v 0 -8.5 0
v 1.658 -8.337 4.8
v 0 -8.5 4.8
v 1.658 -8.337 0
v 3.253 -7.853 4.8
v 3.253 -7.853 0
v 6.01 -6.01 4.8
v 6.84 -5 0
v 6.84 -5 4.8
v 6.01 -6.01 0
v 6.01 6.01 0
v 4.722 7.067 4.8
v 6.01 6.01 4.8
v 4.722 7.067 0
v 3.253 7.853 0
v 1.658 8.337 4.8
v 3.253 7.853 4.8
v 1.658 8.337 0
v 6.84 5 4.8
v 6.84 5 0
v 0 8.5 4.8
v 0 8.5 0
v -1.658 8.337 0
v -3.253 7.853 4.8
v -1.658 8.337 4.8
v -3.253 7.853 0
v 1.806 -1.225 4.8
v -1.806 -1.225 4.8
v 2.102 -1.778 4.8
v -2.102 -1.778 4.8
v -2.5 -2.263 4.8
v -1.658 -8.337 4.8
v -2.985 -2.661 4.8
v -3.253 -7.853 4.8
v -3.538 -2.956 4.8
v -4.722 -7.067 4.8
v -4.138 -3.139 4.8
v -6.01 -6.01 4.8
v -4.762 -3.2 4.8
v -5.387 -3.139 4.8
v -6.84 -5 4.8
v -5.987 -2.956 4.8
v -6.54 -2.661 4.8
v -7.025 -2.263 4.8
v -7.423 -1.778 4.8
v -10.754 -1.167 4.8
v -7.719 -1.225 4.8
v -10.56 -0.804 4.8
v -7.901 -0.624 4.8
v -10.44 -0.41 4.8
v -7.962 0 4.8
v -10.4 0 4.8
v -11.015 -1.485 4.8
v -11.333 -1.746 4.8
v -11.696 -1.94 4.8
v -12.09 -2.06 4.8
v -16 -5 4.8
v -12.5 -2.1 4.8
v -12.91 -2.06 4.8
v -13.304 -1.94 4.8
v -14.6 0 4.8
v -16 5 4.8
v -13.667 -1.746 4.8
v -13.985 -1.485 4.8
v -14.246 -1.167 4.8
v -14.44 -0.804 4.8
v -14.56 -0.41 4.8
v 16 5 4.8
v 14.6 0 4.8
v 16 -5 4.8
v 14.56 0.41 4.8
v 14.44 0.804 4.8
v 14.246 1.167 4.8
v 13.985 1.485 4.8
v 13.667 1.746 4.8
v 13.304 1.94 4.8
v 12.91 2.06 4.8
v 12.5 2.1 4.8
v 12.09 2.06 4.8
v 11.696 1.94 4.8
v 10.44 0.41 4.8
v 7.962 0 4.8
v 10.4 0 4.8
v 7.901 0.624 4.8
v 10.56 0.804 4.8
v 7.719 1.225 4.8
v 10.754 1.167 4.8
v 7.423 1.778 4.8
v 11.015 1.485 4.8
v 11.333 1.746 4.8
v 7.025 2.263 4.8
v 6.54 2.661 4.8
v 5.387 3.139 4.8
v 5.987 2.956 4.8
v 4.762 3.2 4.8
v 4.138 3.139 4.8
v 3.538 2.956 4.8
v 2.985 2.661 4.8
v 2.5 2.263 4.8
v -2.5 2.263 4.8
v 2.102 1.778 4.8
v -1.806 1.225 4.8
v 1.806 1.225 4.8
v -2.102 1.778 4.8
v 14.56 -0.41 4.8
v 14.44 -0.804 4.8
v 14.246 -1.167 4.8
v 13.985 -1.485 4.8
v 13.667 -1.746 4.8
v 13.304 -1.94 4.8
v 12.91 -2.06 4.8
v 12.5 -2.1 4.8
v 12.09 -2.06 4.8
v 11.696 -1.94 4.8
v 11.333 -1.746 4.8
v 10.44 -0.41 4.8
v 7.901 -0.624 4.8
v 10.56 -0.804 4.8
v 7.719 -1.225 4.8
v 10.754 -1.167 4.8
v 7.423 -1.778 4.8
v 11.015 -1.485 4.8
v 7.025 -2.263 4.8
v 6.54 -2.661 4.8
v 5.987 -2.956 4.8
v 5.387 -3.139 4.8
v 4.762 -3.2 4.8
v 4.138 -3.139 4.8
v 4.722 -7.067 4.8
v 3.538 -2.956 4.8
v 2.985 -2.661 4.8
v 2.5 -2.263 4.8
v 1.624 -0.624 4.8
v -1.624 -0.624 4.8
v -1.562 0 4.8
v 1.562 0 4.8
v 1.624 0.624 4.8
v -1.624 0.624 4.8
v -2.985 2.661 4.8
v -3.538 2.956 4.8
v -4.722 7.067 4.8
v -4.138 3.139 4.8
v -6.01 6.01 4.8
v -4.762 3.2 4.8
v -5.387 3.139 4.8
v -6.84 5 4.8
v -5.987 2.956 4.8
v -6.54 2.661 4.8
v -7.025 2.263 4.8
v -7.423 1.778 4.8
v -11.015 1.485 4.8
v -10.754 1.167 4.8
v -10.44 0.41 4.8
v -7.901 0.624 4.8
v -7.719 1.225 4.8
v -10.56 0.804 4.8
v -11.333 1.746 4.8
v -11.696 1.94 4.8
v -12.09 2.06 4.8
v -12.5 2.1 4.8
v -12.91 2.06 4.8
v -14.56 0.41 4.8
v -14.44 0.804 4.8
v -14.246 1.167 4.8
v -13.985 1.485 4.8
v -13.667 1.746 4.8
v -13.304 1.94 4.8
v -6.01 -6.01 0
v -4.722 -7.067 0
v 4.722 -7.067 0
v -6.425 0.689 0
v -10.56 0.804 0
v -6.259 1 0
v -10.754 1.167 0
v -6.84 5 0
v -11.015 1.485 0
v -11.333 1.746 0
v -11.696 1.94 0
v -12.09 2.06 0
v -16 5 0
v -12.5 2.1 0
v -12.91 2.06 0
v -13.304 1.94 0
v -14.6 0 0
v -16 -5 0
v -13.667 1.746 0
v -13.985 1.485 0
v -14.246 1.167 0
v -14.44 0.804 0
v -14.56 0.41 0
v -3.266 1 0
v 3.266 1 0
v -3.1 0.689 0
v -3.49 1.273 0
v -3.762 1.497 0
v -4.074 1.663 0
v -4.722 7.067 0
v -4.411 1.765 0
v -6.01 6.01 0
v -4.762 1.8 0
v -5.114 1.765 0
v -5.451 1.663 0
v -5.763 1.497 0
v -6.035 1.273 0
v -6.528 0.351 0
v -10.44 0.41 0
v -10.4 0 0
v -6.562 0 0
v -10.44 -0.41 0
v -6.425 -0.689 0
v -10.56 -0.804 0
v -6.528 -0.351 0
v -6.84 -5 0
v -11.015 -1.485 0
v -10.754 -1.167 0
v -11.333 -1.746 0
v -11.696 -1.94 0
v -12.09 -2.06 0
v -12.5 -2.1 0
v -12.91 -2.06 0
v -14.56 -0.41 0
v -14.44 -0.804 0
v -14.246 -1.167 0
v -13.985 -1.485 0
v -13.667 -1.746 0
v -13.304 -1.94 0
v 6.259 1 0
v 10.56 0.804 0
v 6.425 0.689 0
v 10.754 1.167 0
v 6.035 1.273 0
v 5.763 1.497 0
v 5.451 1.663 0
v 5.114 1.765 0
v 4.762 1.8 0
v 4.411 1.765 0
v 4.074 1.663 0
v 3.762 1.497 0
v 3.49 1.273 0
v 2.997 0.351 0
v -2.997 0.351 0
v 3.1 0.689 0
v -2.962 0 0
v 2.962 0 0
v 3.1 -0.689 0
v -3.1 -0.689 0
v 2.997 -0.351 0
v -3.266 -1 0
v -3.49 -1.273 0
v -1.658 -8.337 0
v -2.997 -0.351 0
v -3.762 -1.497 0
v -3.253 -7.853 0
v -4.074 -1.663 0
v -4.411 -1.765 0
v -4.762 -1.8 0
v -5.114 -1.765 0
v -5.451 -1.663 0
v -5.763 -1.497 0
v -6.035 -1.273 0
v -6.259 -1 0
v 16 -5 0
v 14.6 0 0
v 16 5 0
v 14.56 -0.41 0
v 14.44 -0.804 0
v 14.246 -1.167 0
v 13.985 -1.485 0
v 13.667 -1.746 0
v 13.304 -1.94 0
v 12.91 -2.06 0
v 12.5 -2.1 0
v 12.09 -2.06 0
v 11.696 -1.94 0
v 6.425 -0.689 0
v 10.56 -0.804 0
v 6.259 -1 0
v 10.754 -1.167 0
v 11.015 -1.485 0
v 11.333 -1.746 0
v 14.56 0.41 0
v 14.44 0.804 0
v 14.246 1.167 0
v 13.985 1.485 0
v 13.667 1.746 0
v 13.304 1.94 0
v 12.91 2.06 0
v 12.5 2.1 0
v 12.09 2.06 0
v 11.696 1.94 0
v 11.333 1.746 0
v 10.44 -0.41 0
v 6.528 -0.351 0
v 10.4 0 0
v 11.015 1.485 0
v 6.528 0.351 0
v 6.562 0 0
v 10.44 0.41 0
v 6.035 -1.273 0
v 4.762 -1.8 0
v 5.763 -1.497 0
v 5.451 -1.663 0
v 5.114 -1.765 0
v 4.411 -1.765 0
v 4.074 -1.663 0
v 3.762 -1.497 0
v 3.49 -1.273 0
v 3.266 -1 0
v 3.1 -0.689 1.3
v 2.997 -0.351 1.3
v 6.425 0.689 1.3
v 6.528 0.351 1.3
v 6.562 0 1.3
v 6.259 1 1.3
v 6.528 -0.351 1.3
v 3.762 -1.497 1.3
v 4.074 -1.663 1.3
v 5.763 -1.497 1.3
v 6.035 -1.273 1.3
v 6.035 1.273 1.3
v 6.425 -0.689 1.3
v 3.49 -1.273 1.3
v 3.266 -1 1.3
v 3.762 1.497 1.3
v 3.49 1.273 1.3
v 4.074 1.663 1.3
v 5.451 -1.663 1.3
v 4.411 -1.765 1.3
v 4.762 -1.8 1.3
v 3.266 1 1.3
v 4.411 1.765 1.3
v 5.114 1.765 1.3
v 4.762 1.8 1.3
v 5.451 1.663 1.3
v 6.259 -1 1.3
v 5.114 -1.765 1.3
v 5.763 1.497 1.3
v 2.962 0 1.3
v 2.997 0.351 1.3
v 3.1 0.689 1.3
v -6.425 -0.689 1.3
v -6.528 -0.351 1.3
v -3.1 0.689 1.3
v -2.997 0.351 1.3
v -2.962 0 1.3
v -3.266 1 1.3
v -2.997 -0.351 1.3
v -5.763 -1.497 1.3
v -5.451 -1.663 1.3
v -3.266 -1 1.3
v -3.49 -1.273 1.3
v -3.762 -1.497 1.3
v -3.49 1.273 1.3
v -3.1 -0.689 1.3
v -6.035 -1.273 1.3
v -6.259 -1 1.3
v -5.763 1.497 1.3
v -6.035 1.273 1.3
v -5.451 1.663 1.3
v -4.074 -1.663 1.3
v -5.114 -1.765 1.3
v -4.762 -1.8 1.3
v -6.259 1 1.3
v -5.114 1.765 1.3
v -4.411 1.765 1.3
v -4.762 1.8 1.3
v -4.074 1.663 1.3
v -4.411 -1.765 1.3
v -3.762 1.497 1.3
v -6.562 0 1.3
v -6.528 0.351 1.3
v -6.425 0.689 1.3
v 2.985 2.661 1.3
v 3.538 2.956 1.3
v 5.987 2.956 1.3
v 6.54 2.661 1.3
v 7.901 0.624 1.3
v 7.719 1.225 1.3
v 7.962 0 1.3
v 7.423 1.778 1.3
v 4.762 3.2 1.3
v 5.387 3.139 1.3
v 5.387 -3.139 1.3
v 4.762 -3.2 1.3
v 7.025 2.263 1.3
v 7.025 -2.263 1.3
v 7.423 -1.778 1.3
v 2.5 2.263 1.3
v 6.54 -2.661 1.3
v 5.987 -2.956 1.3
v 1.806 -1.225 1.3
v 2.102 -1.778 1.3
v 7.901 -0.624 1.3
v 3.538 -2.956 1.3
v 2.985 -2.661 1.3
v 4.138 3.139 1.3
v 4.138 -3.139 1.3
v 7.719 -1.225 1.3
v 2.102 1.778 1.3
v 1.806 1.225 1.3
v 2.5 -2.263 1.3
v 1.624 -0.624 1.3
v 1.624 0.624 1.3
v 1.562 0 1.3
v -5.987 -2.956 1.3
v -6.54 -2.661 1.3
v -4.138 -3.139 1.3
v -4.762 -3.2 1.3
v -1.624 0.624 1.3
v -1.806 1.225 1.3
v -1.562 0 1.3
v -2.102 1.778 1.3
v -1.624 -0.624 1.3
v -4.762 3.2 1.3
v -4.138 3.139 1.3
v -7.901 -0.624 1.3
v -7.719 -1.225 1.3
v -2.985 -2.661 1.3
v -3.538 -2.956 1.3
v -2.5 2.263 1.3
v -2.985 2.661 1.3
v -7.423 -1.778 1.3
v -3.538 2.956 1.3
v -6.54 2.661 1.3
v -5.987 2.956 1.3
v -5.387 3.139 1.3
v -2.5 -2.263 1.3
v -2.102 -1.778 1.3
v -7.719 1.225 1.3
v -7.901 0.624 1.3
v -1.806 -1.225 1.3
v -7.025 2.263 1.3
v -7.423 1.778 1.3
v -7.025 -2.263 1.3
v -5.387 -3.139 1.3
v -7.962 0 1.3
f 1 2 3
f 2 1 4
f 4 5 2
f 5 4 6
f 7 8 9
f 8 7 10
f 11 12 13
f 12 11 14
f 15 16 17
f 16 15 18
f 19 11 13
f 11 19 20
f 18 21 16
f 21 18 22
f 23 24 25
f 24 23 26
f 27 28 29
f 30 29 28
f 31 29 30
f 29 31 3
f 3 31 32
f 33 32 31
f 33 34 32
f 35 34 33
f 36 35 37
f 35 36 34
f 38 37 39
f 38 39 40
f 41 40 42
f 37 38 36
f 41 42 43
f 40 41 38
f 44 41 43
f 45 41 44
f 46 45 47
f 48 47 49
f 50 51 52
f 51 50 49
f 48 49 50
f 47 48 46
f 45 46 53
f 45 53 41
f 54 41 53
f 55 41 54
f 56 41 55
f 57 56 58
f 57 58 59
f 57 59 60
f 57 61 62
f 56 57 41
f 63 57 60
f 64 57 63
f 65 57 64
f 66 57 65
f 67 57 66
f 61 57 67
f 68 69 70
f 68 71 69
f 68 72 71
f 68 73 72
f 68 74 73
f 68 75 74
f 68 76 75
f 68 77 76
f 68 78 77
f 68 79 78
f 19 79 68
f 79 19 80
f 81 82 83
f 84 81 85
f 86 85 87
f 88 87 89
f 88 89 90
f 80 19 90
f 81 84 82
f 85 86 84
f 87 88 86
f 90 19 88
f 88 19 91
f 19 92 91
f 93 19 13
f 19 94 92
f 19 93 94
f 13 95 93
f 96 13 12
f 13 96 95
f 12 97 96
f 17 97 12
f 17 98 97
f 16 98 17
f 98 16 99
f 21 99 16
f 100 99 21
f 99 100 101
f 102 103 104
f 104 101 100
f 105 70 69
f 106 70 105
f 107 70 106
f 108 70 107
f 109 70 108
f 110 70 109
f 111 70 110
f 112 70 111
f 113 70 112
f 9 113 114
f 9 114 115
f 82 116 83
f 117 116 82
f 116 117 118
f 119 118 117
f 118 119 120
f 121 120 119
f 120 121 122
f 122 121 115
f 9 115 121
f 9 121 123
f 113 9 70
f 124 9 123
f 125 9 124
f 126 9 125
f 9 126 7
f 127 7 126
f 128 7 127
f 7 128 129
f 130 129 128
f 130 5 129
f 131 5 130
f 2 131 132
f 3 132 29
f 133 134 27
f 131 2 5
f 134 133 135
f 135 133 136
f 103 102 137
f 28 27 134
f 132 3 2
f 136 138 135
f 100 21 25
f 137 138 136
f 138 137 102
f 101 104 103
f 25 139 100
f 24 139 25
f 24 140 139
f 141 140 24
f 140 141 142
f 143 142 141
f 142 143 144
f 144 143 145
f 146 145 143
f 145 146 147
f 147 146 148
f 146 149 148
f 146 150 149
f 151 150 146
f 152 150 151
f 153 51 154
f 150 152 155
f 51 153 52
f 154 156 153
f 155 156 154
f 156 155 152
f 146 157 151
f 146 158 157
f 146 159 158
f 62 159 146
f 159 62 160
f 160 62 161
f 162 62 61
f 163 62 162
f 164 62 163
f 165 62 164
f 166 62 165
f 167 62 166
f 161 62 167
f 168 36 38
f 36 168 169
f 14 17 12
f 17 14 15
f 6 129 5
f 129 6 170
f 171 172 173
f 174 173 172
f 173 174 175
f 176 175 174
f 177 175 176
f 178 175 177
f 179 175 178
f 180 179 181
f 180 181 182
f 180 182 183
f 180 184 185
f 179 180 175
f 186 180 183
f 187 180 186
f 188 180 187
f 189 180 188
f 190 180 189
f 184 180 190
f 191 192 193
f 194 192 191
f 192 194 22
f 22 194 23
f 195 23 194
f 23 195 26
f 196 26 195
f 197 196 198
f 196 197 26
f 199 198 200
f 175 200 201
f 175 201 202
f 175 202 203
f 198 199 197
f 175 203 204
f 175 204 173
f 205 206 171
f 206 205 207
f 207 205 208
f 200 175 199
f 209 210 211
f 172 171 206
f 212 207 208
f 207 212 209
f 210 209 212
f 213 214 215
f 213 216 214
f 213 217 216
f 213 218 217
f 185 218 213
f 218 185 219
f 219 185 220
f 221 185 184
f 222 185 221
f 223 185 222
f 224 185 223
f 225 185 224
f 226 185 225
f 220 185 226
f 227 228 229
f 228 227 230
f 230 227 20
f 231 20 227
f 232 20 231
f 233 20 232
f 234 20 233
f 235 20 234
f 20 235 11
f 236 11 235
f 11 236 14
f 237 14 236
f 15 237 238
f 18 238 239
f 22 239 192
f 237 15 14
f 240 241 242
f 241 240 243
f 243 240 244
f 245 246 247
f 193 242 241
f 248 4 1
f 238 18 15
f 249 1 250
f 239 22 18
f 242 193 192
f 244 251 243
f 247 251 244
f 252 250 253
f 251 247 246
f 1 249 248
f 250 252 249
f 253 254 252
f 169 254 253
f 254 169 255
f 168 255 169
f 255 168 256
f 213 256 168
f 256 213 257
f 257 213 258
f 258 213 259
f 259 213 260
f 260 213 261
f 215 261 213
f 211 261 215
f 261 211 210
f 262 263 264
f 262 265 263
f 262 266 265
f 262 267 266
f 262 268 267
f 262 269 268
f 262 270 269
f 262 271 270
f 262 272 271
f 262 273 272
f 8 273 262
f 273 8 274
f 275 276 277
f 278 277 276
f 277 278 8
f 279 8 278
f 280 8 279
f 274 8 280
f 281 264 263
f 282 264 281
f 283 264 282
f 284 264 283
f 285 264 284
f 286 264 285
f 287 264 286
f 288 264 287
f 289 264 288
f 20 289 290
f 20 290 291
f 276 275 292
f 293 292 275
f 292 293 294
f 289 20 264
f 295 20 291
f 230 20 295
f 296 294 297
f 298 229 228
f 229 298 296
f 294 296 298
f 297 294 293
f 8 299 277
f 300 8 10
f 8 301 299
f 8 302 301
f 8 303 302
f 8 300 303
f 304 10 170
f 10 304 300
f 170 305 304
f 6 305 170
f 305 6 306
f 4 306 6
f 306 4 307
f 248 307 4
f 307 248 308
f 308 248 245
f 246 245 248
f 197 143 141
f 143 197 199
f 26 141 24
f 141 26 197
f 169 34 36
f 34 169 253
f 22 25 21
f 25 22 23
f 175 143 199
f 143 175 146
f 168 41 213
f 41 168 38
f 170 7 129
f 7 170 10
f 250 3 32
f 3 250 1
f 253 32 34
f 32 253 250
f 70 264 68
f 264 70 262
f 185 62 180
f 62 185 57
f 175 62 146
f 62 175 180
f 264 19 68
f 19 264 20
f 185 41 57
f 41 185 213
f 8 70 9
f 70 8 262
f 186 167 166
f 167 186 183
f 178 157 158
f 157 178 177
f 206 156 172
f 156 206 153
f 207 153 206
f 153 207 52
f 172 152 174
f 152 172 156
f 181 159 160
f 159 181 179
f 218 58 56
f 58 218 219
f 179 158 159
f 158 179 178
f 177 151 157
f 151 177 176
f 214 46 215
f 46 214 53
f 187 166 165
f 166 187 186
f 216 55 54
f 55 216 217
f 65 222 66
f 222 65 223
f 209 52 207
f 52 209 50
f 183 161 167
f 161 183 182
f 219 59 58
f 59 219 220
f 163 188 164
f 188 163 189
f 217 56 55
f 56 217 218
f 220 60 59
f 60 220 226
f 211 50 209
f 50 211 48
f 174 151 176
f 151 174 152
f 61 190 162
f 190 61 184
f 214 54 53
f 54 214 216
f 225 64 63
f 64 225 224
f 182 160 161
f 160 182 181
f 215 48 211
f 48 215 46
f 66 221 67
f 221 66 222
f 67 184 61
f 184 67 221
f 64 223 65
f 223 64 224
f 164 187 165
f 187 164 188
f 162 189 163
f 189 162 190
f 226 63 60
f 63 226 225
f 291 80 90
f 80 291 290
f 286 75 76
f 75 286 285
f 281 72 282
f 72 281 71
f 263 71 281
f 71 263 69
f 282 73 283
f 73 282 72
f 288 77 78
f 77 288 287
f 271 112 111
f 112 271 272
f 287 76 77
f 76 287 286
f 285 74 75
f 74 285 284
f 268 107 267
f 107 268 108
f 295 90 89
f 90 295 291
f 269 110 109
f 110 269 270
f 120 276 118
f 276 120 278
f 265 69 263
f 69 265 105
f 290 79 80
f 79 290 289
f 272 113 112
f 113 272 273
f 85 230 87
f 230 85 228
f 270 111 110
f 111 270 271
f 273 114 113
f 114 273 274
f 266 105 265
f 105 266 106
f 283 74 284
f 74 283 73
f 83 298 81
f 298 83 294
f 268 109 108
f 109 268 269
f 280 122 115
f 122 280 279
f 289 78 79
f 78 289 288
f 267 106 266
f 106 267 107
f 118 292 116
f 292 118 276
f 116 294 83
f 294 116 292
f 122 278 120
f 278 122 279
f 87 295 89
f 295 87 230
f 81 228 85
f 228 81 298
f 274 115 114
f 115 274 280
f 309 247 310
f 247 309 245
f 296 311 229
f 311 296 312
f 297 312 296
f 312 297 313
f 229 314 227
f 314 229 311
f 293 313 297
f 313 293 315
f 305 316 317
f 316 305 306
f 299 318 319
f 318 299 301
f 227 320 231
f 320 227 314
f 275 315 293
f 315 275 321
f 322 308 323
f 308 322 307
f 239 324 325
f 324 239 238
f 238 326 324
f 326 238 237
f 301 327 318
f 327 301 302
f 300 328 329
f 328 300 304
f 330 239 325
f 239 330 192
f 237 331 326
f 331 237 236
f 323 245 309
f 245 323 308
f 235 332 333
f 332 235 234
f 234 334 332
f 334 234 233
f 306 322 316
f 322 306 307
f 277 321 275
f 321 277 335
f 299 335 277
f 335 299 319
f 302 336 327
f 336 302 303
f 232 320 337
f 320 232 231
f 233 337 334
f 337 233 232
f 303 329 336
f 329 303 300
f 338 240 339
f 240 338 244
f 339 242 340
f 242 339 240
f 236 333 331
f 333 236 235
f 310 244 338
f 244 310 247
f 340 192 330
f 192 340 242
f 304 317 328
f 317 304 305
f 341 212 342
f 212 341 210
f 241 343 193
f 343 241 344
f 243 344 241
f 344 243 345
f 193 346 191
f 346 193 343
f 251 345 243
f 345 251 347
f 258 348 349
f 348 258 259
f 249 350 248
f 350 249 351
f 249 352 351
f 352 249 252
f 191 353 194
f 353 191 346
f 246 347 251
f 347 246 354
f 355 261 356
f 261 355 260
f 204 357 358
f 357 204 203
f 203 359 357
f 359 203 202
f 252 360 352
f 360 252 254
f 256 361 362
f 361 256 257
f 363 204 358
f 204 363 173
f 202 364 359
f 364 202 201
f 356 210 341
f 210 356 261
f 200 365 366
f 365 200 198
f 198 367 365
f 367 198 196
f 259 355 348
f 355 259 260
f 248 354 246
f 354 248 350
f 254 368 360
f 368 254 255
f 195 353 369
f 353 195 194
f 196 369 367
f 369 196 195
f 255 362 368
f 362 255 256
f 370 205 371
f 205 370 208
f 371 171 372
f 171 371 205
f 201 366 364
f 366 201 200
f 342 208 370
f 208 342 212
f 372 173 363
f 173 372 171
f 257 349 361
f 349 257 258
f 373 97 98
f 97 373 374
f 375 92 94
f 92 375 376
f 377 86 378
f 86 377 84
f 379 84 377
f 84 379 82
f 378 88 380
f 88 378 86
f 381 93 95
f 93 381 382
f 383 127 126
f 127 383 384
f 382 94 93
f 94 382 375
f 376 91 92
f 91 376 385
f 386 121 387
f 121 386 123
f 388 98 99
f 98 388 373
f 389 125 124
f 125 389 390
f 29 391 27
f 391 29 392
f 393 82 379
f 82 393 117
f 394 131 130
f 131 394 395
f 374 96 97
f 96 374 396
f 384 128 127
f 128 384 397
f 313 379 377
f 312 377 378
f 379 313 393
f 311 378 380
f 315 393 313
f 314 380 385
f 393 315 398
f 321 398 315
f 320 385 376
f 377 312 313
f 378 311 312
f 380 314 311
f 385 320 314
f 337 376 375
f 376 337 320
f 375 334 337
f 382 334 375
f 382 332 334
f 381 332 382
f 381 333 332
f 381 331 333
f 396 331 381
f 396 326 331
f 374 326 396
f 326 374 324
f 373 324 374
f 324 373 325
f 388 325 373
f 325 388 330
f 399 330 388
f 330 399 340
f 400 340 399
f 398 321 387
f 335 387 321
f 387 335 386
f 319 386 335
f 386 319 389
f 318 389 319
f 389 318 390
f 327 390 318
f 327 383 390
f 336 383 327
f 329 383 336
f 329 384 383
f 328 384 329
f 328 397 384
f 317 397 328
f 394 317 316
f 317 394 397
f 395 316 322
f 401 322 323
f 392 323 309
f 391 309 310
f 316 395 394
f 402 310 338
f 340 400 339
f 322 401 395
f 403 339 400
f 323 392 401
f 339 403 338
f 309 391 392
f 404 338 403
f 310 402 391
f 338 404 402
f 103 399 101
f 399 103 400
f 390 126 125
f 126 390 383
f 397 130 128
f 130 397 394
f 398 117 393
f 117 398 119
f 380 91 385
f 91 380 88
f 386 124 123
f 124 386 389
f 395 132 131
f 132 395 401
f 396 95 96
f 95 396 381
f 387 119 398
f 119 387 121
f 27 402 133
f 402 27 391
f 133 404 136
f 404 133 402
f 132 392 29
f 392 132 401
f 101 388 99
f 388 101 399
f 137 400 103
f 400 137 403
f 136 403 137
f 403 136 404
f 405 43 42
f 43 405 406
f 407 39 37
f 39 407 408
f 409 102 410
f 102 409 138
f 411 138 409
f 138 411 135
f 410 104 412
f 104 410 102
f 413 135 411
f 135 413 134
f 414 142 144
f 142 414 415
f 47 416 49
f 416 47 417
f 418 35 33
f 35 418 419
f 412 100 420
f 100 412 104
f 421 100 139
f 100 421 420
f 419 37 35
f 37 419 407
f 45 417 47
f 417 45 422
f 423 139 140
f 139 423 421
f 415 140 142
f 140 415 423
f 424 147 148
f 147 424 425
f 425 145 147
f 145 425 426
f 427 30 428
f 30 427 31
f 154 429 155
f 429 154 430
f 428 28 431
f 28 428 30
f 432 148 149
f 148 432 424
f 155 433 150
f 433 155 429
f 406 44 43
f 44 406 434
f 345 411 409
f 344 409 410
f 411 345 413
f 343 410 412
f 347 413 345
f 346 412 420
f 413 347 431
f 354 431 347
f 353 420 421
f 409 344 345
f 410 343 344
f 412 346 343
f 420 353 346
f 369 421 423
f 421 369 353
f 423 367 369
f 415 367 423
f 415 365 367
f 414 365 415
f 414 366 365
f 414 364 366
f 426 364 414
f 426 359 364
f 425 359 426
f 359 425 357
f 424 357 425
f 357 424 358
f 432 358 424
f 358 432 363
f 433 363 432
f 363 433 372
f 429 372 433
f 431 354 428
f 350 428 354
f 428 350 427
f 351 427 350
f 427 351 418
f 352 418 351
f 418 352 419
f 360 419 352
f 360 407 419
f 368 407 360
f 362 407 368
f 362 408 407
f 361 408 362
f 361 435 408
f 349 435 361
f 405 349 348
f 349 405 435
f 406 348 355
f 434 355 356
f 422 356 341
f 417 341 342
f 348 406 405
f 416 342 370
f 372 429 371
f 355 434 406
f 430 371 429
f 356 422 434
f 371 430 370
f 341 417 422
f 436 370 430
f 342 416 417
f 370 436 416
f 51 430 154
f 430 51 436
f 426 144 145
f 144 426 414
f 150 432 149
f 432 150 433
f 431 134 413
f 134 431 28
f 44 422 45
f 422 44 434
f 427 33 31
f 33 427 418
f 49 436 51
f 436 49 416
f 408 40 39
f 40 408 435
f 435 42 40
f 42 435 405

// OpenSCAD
// file: OpenSampler_v4_config_v0p0.scad
in=25.4;
xs=20;

Lx=440; //was 590 in Opensampler V2,was 480 in Opensampler V3.03
Ly=285;	//was 380 in OpenSampler V2,was 315 in OpenSampler V3.03
Lz=240; // was 220 in Opensampler V2, was 200 in Opensampler V3.03
La=135; //length of moving part on z-axis, was 140 in Opensampler V3.03
LyPlate=169; // length of y-plate that z-axis moves on. was 169 in V3.10

nema17holespac=31;
nema17diagholespac=43.84;

xyarm=28;
zyarm=Lz+xs+6;

platethick=3.175;
backpanelthick=6.35;
frontpanelthick=6;
bottomthick=12.7;
belt_end_thick=4.8;

wheeloffset=12;
plateoffset=wheeloffset-10;

//distance from extrusion surface to bottom plate=2.2mm
// plates are about 2.8mm making plate surface 5mm of extrusion
//hole spacing for wheels: 40.64,60.64,80.64,100.64
// BETTER hole spacing for wheels: 40.0,60.0,80.0,100.0
// hole diam for fixed wheel:5mm, for eccentric: 7.14mm
// spacer block and acme block are 12mm thick.
// 125ml (100ml) bottle size: h=95mm, diam=52mm

// 60mm clearancy for needle and spings etc.
// so height between bottom frame and bottom z-axis:
// trayplate thickness + bottle h + 60
// 13 + 108 + 60 = 188mm

// tallest bottle: 155, smallest bottle: 105
// minimum clearance: 10, spring action: 40
// vertical movement: 155-105+10+30=90


// FOR OpenSampler V4 
// more z-height, 155mm 16mm diam vials expected
// ordered vials of KIMAX 16*150mm, which are 155mm high with cap
// change y cart to have 6 mini wheels for Z-axis
// fit 3 trays of 5*8 (103*160mm, 19mm spacing, 4mm edge)
// main file
include <OpenSampler_v4_config_v0p0.scad>;
$fn=32;


module E1x1(len){
	translate([0,0,0])
	difference(){
		translate([-xs/2,-xs/2,0])
		cube([xs,xs,len]);
		for ( i = [0 : 3] ){
			rotate([0,0,i*90])
			translate([-xs/2-1,-xs/8,-1])
			cube([xs/4,xs/4,len+2]);
		}
		translate([0,0,-1])
		cylinder(r=2.5,h=len+2);
	}	
}

module E1x2(len){
	translate([0,-xs*1/2,0]){
		E1x1(len);
		translate([0,xs,0])
		E1x1(len);
	}
}

module E1x3(len){
	translate([0,-xs*1,0]){
		E1x1(len);
		translate([0,xs,0])
		E1x1(len);
		translate([0,xs*2,0])
		E1x1(len);
	}
}

module wheel(){
	difference(){
		cylinder(r=12,h=11,center=true,$fn=25);
		cylinder(r=2.5,h=12,center=true);
	}
}

module mini_wheel(){
	difference(){
		cylinder(r=7.65,h=10,center=true);
		cylinder(r=2.5,h=12,center=true);
	}
}

// stepper nema 17, with some extra space around
module stepper(){ 
	difference(){
		union(){
			translate([-21,-21,-40])	
				cube([42,42,40],center=false);
			cylinder(r=2.5,h=30,center=false);
			cylinder(r=12,h=4,center=true);
			translate([-15.5,-15.5,0])
				cylinder(r=1.5,h=10,center=false);
			translate([15.5,-15.5,0])
				cylinder(r=1.5,h=10,center=false);
			translate([15.5,15.5,0])
				cylinder(r=1.5,h=10,center=false);
			translate([-15.5,15.5,0])
				cylinder(r=1.5,h=10,center=false);

			translate([0,0,10])
				cylinder(r=8,h=15,center=false);				
		}
	}
}

// stepper nema 17, with TR8-2 rod
module z_stepper(len){ 
	difference(){
		union(){
			translate([-21,-21,-40])	
				cube([42,42,40],center=false);
			cylinder(r=2.5,h=30,center=false);
			cylinder(r=12,h=4,center=true);
			translate([-15.5,-15.5,0])
				cylinder(r=1.5,h=10,center=false);
			translate([15.5,-15.5,0])
				cylinder(r=1.5,h=10,center=false);
			translate([15.5,15.5,0])
				cylinder(r=1.5,h=10,center=false);
			translate([-15.5,15.5,0])
				cylinder(r=1.5,h=10,center=false);
			translate([0,0,0])
				cylinder(r=4,h=len,center=false);					
		}
	}
}


module stepper_holes(){ 
	difference(){
		union(){
			translate([-21.5,-21.5,-49])	
				cube([43,43,49],center=false);
			cylinder(r=2.5,h=70,center=true);
			cylinder(r=14,h=10,center=false);
			cylinder(r=6,h=35,center=false);
			translate([-15.5,-15.5,0])
				cylinder(r=2,h=80,center=true);
			translate([15.5,-15.5,0])
				cylinder(r=2,h=80,center=true);
			translate([15.5,15.5,0])
				cylinder(r=2,h=80,center=true);
			translate([-15.5,15.5,0])
				cylinder(r=2,h=80,center=true);
		
		}
	}
}

// Main plate for x-axis movement 4.8mm aluminum (3/16")
module x_plate_top(){
	difference(){
		union(){
			translate([-5,-37,0])
			cube([115,76,4.8]);

			translate([(104+51.5)/2-21,35-24,0])
			cube([42,42,4.8]);				
            
            // wheels are just for display
			translate([2,-30,-12])
			wheel();
			translate([54,-30,-12])
			wheel();
			translate([104,-30,-12])
			wheel();

			translate([2,30,-12])
			wheel();
			translate([49,30,-12])
			wheel();
			translate([104,30,-12])
			wheel();
		}
        // holes for adjustable wheels
		translate([2,-30,-1])
		cylinder(r=3.57,h=10);
		translate([54,-30,-1])
		cylinder(r=3.57,h=10);
		translate([104,-30,-1])
		cylinder(r=3.57,h=10);

        // holes for M5 thread for wheels
		translate([2,30,-1])
		cylinder(r=2.1,h=10);
		translate([49,30,-1])
		cylinder(r=2.1,h=10);
		translate([104,30,-1])
		cylinder(r=2.1,h=10);

        // holes for attachment y-arm
		translate([xyarm,0,-1]){
			translate([0,30,0])
			cylinder(r=2.5,h=10);
			translate([0,0,0])
			cylinder(r=2.5,h=10);
			translate([0,-25,0])
			cylinder(r=2.5,h=10);
		}
        // pocket for secure attachment of y-arm
		translate([xyarm,0,0])        
        translate([-10,-50,3.2])
        cube([20,100,10]);

        // holes for 20mm endstop switch
		translate([2,-3,-1]){
			translate([0,-4.75,0])
			cylinder(r=1.2,h=10);
			translate([0,4.75,0])
			cylinder(r=1.2,h=10);
		}
        // holes for stepper motor
        translate([(104+51.5)/2,32,4.8+0.1])
        rotate([0,180,0])
        stepper_holes();

	}
	
}



module y_plate_top(){
	difference(){
		union(){
			translate([-36,-32,0])
			cube([LyPlate,64,platethick]);
			translate([-30,-20,-12])
			wheel();
			translate([30,-26,-12])
			wheel();
			translate([-30,26,-12])
			wheel();
			translate([30,26,-12])
			wheel();

			translate([50,25.7,15])
			mini_wheel();
			translate([50,-25.7,15])
			mini_wheel();
			translate([-25,-25,0])
			cube([50,50,3]);
			translate([17,25.7,15])
			mini_wheel();
			translate([17,-25.7,15])
			mini_wheel();
			translate([-16,25.7,15])
			mini_wheel();
			translate([-16,-25.7,15])
			mini_wheel();



		}
		translate([60,0,-1])
		cylinder(r=2.5,h=10);

		translate([30,26,-1])
		cylinder(r=2.5,h=10);
		translate([30,-26,-1])
		cylinder(r=2.5,h=10);

		translate([-30,26,-1])
		cylinder(r=3.57,h=10);
		translate([-30,-20,-1])
		cylinder(r=3.57,h=10);


		translate([50,25.7,-1])
		cylinder(r=3.57,h=10);
		translate([50,-25.7,-1])
		cylinder(r=2.5,h=10);
		translate([17,25.7,-1])
		cylinder(r=3.57,h=10);
		translate([17,-25.7,-1])
		cylinder(r=2.5,h=10);
		translate([-16,25.7,-1])
		cylinder(r=3.57,h=10);
		translate([-16,-25.7,-1])
		cylinder(r=2.5,h=10);

		translate([LyPlate-36-10,-30,-1]){
			translate([-4.75,0,0])
			cylinder(r=1.2,h=10);
			translate([4.75,0,0])
			cylinder(r=1.2,h=10);
		}
 		translate([LyPlate-36,0,-1]){ 
 			translate([-15,-15,0])
			cylinder(r=2.1,h=10);
			translate([-15,15,0])
			cylinder(r=2.1,h=10);     
        }      


	}	


}
module y_plate_bottom(){
	difference(){
		union(){
			translate([35,0,0])
			cylinder(r=32,h=3);
			translate([35,-32,0])
			cube([32,32,3]);
		}
        // holes for M5 thread to attach to y_plate_top
		translate([+30,-26,-1])
		cylinder(r=2.1,h=10);
		translate([+30,26,-1])
		cylinder(r=2.1,h=10);

		translate([60,0,-1])
		cylinder(r=2.1,h=10);

        // cut not needed part off
		translate([0,-32,-1])
		cube([15,64,10]);

        //holes for stepper motor
        translate([36,0,-1])
        stepper_holes();
        
        // hole for cable carrier
        translate([59,-26,-1])
        cylinder(r=2.1,h=100);
	}	
}



module z_motorplate(){
	difference(){
		union(){
            translate([0,-5,0])
			cylinder(r=32,h=platethick);
			translate([-32,-(xs/2+plateoffset+platethick*2),0])
			cube([64,(xs/2+plateoffset+platethick*2)-5,platethick]);

			translate([-32,-18.4,-25])
			cube([64,platethick,25]);
		}
        translate([-35,21,-1])
        cube([70,50,platethick+2]);
        
        // for acme T8 stepper
 		translate([0,0,-1])
		cylinder(r=12,h=10);       

        //holes for 0 deg stepper
 		translate([nema17holespac/2,nema17holespac/2,-1])
		cylinder(r=1.8,h=10);
		translate([-nema17holespac/2,nema17holespac/2,-1])
		cylinder(r=1.8,h=10);       

		translate([-10,-17-10,-1])
		cylinder(r=2.5,h=10);
		translate([10,-17-10,-1])
		cylinder(r=2.5,h=10);

		translate([-50,-118.4,-5])
		cube([100,100,10]);
        
      //holes for connecting to y_plate
        translate([-15,-20,-15])
        rotate([-90,0,0])
        cylinder(r=2.5,h=100);
        translate([15,-20,-15])
        rotate([-90,0,0])
        cylinder(r=2.5,h=100);

	}

}

module belt_end_plate(){
    difference(){
            translate([-20,-10,0])
            cube([40,20,belt_end_thick]);
            //deep under belt
            translate([-10,0,-1])
            cylinder(r=2.55,h=10);
            translate([-10,0,1.3])
            cylinder(r=4.55,h=10);
            // normal
            translate([10,0,-1])
            cylinder(r=2.55,h=10);           
            translate([10,0,3.3])
            cylinder(r=4.55,h=10);   
            // belt clamp screws
            translate([0,5,-1])
            cylinder(r=2,h=10);           
            translate([0,5,3])
            cylinder(r=4.55,h=10);
            translate([0,-5,-1])
            cylinder(r=2,h=10);           
            translate([0,-5,3])
            cylinder(r=4.55,h=10);  
        
            //belt holes
            translate([-16.5,2,-1])
            cylinder(r=1.5,h=10);           
            translate([-16.5,-2,-1])
            cylinder(r=1.5,h=10);      
            translate([3.5,2,-1])
            cylinder(r=1.5,h=10);           
            translate([3.5,-2,-1])
            cylinder(r=1.5,h=10); 
            translate([-18,-2,-1])
            cube([3,4,10]);
            translate([2,-2,-1])
            cube([3,4,10]);
            
            translate([-16.5,-3.5,2.8])
            cube([20,7,10]);
        
    }
}

module belt_end_plate_x(){
    difference(){
            union(){
                translate([-20,-10,0])
                cube([40,20,belt_end_thick]);
                translate([0,10,0])
                cylinder(r=19.99,h=belt_end_thick);
            }
                 
            //deep under belt
            translate([-10,0,-1])
            cylinder(r=2.55,h=10);
            translate([-10,0,1.3])
            cylinder(r=4.55,h=10);
            // normal
            translate([10,0,-1])
            cylinder(r=2.55,h=10);           
            translate([10,0,3.3])
            cylinder(r=4.55,h=10);   
            // belt clamp screws
            translate([0,5,-1])
            cylinder(r=2,h=10);           
            translate([0,5,3])
            cylinder(r=4.55,h=10);
            translate([0,-5,-1])
            cylinder(r=2,h=10);           
            translate([0,-5,3])
            cylinder(r=4.55,h=10);  
        
            //belt holes
            translate([-16.5,2,-1])
            cylinder(r=1.5,h=10);           
            translate([-16.5,-2,-1])
            cylinder(r=1.5,h=10);      
            translate([3.5,2,-1])
            cylinder(r=1.5,h=10);           
            translate([3.5,-2,-1])
            cylinder(r=1.5,h=10); 
            translate([-18,-2,-1])
            cube([3,4,10]);
            translate([2,-2,-1])
            cube([3,4,10]);
            
            translate([-16.5,-3.5,2.8])
            cube([20,7,10]);
        
    }
}

module backpanel(){
	difference(){
		cube([Lx,backpanelthick,Lz-xs]);
		translate([xs+20,-1,xs+20+bottomthick])
		rotate([-90,0,0])
		cylinder(r=15,h=backpanelthick+2);

		translate([xs/2,-1,Lz-xs-20])
		rotate([-90,0,0])
		cylinder(r=2.55,h=backpanelthick+2);
		translate([xs/2,-1,xs+20])
		rotate([-90,0,0])
		cylinder(r=2.55,h=backpanelthick+2);

		translate([Lx-xs/2,-1,Lz-xs-20])
		rotate([-90,0,0])
		cylinder(r=2.55,h=backpanelthick+2);
		translate([Lx-xs/2,-1,xs+20])
		rotate([-90,0,0])
		cylinder(r=2.55,h=backpanelthick+2);

		translate([Lx/2,-1,xs/2])
		rotate([-90,0,0])
		cylinder(r=2.55,h=backpanelthick+2);
		
	}
}

module xcablecarrier(){
	translate([200,-xs,Lz-xs-80])
	cube([Lx-xs-200-2,xs+1, 6]);

}

module frontpanel(){
	difference(){
		translate([0,-xs*3-frontpanelthick,xs+bottomthick-2])
		cube([Lx,backpanelthick,Lz-xs*2-bottomthick+2]);

		translate([xs/2,-xs*3-frontpanelthick-1,xs+40])
		rotate([-90,0,0])
		cylinder(r=2.55,h=backpanelthick+2);
		translate([xs/2,-xs*3-frontpanelthick-1,Lz-xs-20])
		rotate([-90,0,0])
		cylinder(r=2.55,h=backpanelthick+2);

		translate([Lx-xs/2,-xs*3-frontpanelthick-1,xs+40])
		rotate([-90,0,0])
		cylinder(r=2.55,h=backpanelthick+2);
		translate([Lx-xs/2,-xs*3-frontpanelthick-1,Lz-xs-20])
		rotate([-90,0,0])
		cylinder(r=2.55,h=backpanelthick+2);
	}
}

module bottomplate(){
	difference(){
		translate([0,-Ly,xs])
		cube([Lx,Ly,bottomthick]);
		
		translate([-1,-xs*3,xs-1])
		cube([xs+1,3*xs+2,xs+2]);
		translate([Lx-xs,-xs*3,xs-1])
		cube([xs+1,3*xs+2,xs+2]);

		translate([xs/2,-Ly+xs*1.5,xs-1])
		cylinder(r=2.55,h=20);
		translate([Lx-xs/2,-Ly+xs*1.5,xs-1])
		cylinder(r=2.55,h=20);
		translate([Lx/2,-Ly+xs/2,xs-1])
		cylinder(r=2.55,h=20);

		translate([xs/2,-Ly/3,xs-1])
		cylinder(r=2.55,h=20);
		translate([Lx-xs/2,-Ly/3,xs-1])
		cylinder(r=2.55,h=20);

		translate([Lx/2,-xs/2,xs-1])
		cylinder(r=2.55,h=20);


		translate([-1,-xs*3-6.25,xs+bottomthick-2])
		cube([Lx+2,6.35,Lz]);

		translate([250,-xs*3-3.125,0]){
			translate([0,0,0])
			cylinder(r=2.55,h=100);
			translate([35,0,0])
			cylinder(r=2.55,h=100);
			translate([70,0,0])
			cylinder(r=2.55,h=100);
			translate([105,0,0])
			cylinder(r=2.55,h=100);
			translate([140,0,0])
			cylinder(r=2.55,h=100);
			translate([175,0,0])
			cylinder(r=2.55,h=100);
		}
	}
}

module arduino_mega_holes(){
	union(){
		cube([101,53,2]);
		
		translate([0.55*in,0.1*in,-50])
		cylinder(r=1.5,h=60);
		translate([0.6*in,2*in,-50])
		cylinder(r=1.5,h=60);

		translate([2.6*in,0.3*in,-50])
		cylinder(r=1.5,h=60);
		translate([2.6*in,1.4*in,-50])
		cylinder(r=1.5,h=60);

		translate([3.8*in,0.1*in,-50])
		cylinder(r=1.5,h=60);
		translate([3.55*in,2.0*in,-50])
		cylinder(r=1.5,h=60);
	}
}

module powersupply(){
	cube([130,32,50]);
}

module ramps(){
	union(){
		translate([-15,-8,0])
		cube([115,61,40]);
	}
}

module needle_mount_bottom(){
	difference(){
		union(){
			translate([-20,0,0])
			cube([40,32,9.5]);
	
		}
		translate([-21,18,5])
		cube([42,30,9.5]);	
	
		translate([-9,9,-1])
		cylinder(r=2.1,h=100);
		translate([9,9,-1])
		cylinder(r=2.1,h=100);
	
		translate([-10,24,-1])
		cylinder(r=2.55,h=100);
		translate([10,24,-1])
		cylinder(r=2.55,h=100);
		translate([-10,24,3.2])
		cylinder(r=4.75,h=100);
		translate([10,24,3.2])
		cylinder(r=4.75,h=100);
	
	
		translate([0,-1,10])
		rotate([-90,0,0])
		cylinder(r=3.5,h=3.5);
		
		
		translate([0,2.45,10])
		rotate([-90,0,0])
		cylinder(r=6.4,h=9.3+2.55,$fn=6);
	
		translate([0,14,10])
		rotate([-90,0,0])
		cylinder(r=4,h=3);
	
		translate([0,16,10])
		rotate([-90,0,0])
		cylinder(r=7,h=100);	



		translate([-15,-1,9.7])
		rotate([-90,0,0])
		cylinder(r=3.4,h=100);	
		translate([15,-1,9.7])
		rotate([-90,0,0])
		cylinder(r=3.4,h=100);
	}
}

module needle_mount_top(){
	difference(){
		union(){
			translate([-20,0,0])
			cube([40,18,9.5]);
	
		}
	
		translate([-9,9,-1])
		cylinder(r=2.5,h=100);
		translate([9,9,-1])
		cylinder(r=2.5,h=100);
	
		translate([-10,24,-1])
		cylinder(r=2.55,h=100);
		translate([10,24,-1])
		cylinder(r=2.55,h=100);
		translate([-10,24,3.2])
		cylinder(r=4.75,h=100);
		translate([10,24,3.2])
		cylinder(r=4.75,h=100);
	
	
		translate([0,-1,10])
		rotate([-90,0,0])
		cylinder(r=3.5,h=3.5);
		
		
		translate([0,2.45,10])
		rotate([-90,0,0])
		cylinder(r=6.4,h=9.3+2.55,$fn=6);
	
		translate([0,14,10])
		rotate([-90,0,0])
		cylinder(r=4,h=3);
	
		translate([0,16,10])
		rotate([-90,0,0])
		cylinder(r=7,h=100);	

		translate([-15,-1,9.7])
		rotate([-90,0,0])
		cylinder(r=3.4,h=100);	
		translate([15,-1,9.7])
		rotate([-90,0,0])
		cylinder(r=3.4,h=100);
	}
}

module spring_support_plate(){
    difference(){
        linear_extrude(height=12.7, convexity = 10)
        polygon(points=[[-20,-10],[20,-10],[20,-5],[16,-1],[16,1],[20,5],[20,20],
        [18,24],[12,24],[8,10],[-8,10],[-12,24],[-18,24],[-20,20],[-20,10],
        [-20,5],[-16,1],[-16,-1],[-20,-5]]);
       
        // slight oversized holes for 4mm brass vertical rod of spring plate
        translate([-15,20,-1])
        cylinder(r=2.05,h=100); 
        translate([15,20,-1])
        cylinder(r=2.05,h=100); 
        
        // M5 screw holes and countersinks
        translate([-10,0,-1])
        cylinder(r=2.5,h=100); 
        translate([10,0,-1])
        cylinder(r=2.5,h=100); 
        translate([-10,0,-1])
        cylinder(r=4.75,h=3); 
        translate([10,0,-1])
        cylinder(r=4.75,h=3); 
        
        translate([-21,-11,6.35])
        cube([42,21.01,100]);
       
        // optional center hole for too long trapezium rod on z-stepper motor
        //translate([0,0,-1])
        //cylinder(r=4.5,h=100);
    }   
}

module spring_support_plate_top(){
    difference(){
        translate([-20,-16,0])
        cube([40,16,12.7]);
        
        //center cut-out for sample tubing
        translate([-4,-17,-1])
        cube([8,8,100]);
        translate([0,-17+8,-1])
        cylinder(r=4,h=100); 
       
        // slight oversized holes for 4mm brass vertical rod of spring plate
        translate([-15,-10,-1])
        cylinder(r=2.05,h=100); 
        translate([15,-10,-1])
        cylinder(r=2.05,h=100); 
        
        // M5 screw holes and countersink
        translate([-10,-50,6.35])
        rotate([-90,0,0])
        cylinder(r=2.5,h=100); 
        translate([10,-50,6.35])
        rotate([-90,0,0])
        cylinder(r=2.5,h=100); 
        translate([-10,-17,6.35])
        rotate([-90,0,0])
        cylinder(r=4.75,h=3); 
        translate([10,-17,6.35])
        rotate([-90,0,0])
        cylinder(r=4.75,h=3); 
        
        

    }   
}
module spring_plate(){
    difference(){
        union(){
            cylinder(r=7,h=12.7);
            translate([0,0,6.35])
            scale([1,0.5,1])
            cylinder(r=20,h=6.35);
        }
        translate([0,0,-1])
        cylinder(r1=1.6,r2=6,h=14.7); 
        
        translate([-15,0,-1])
        cylinder(r=1.7,h=100); 
        translate([15,0,-1])
        cylinder(r=1.7,h=100);
    }        
    
}

module end_stop_holder(){
    difference(){
        translate([0,-7,0])
        cube([32,14,5]);
        
        translate([4.5,0,-1])
        cylinder(r=2.55,h=10);
        translate([4.5,-2.55,-1])
        cube([4,5.1,10]);
        translate([8.5,0,-1])
        cylinder(r=2.55,h=10);       
    
        translate([23-4.75,0,-1])
        cylinder(r=1.7,h=10);    
        translate([23+4.75,0,-1])
        cylinder(r=1.7,h=10); 
        
        translate([23-4.75,0,-1])
        cylinder(r=3.5,h=4);    
        translate([23+4.75,0,-1])
        cylinder(r=3.5,h=4); 
    }
}

module solenoid_plate(){
    difference(){
        union(){
            cylinder(r=8.5,h=4.8);
            translate([-16,-5,0])
            cube([32,10,4.8]);
        }
        translate([-12.5,0,-1])
        cylinder(r=2.1,h=10);
        translate([12.5,0,-1])
        cylinder(r=2.1,h=10);        
        
        translate([3/16*in,0,-1])
        cylinder(r=1.8,h=10);
        translate([-3/16*in,0,-1])
        cylinder(r=1.8,h=10);            

        translate([3/16*in,0,1.3])
        cylinder(r=3.2,h=4);
        translate([-3/16*in,0,1.3])
        cylinder(r=3.2,h=4);         
    }    
}

//________________________________________________________________________________
// --------------------individual parts----------------------------------------
//
//$fn=128;
//projection(cut = true){
    solenoid_plate();
//}
//needle_mount_top();

//translate([36,32,-1])
//
//x_plate_top();

//translate([36,32,-1])
//y_plate_top();
//y_plate_bottom();

//y_plate_bottom();


// TOP CUT Z_MOTORPLATE
//translate([32,18.4,-2.5])
//z_motorplate();
//}

// SIDE CUT Z_MOTORPLATE
//translate([0,0,1])
//rotate([-90,0,0])
//translate([32,18.4,-3])
//z_motorplate();
//}
//
//translate([20,10,-4])
//spring_support_plate();
//
//translate([20,10,-10])
//rotate([180,0,0])
//spring_plate();
//
//translate([20,16,-1])
//spring_support_plate_top();
//}

//end_stop_holder();

// _________backpanel__________________
//translate([0,40,0])
//translate([0,180,0])
//rotate([90,0,0])
//difference(){
//	backpanel();
//	translate([-1,10,0])
//	xcablecarrier();
//	translate([+1,10,0])
//	xcablecarrier();
//
//	translate([xs+20,-5,xs+bottomthick+70])
//	rotate([90,0,0])
//	translate([100,53,0])
//	rotate([0,0,180])
//	arduino_mega_holes();
//}
//
//}

//_________________Bottomplate____________________
//translate([0,Ly,-xs])
//bottomplate();


//_____________frontpanel______________________
//translate([0,Lz-xs*2-bottomthick+2,0])
//rotate([90,0,0])
//translate([0,3*xs+6,-xs-bottomthick+2])
//frontpanel();


//
//translate([-241,132,16])
//rotate([0,90,0])
//			difference(){
//				translate([xyarm-xs/2-2,-100,zyarm])
//				rotate([0,-90,0])
//				y_plate_bottom();
//
//				translate([xyarm-xs/2-9,-100,zyarm+35+1])
//				rotate([0,90,0])
//				//rotate([0,0,45])
//				stepper_holes();
//			}



	//motorplate_on_top();

//				//translate([36,32,-1])
//				rotate([0,0,0])
//				difference(){
//				y_plate_top();
//
//				translate([45,0,-1])
//				rotate([0,0,45])
//				stepper_holes();
//			}

//
//translate([5,37,0])
//	difference(){
//		x_plate_top();
//		translate([(104+51.5)/2,32,3+2])
//		rotate([0,180,0])
//		stepper_holes();
//	}

//belt_end_plate_x();
